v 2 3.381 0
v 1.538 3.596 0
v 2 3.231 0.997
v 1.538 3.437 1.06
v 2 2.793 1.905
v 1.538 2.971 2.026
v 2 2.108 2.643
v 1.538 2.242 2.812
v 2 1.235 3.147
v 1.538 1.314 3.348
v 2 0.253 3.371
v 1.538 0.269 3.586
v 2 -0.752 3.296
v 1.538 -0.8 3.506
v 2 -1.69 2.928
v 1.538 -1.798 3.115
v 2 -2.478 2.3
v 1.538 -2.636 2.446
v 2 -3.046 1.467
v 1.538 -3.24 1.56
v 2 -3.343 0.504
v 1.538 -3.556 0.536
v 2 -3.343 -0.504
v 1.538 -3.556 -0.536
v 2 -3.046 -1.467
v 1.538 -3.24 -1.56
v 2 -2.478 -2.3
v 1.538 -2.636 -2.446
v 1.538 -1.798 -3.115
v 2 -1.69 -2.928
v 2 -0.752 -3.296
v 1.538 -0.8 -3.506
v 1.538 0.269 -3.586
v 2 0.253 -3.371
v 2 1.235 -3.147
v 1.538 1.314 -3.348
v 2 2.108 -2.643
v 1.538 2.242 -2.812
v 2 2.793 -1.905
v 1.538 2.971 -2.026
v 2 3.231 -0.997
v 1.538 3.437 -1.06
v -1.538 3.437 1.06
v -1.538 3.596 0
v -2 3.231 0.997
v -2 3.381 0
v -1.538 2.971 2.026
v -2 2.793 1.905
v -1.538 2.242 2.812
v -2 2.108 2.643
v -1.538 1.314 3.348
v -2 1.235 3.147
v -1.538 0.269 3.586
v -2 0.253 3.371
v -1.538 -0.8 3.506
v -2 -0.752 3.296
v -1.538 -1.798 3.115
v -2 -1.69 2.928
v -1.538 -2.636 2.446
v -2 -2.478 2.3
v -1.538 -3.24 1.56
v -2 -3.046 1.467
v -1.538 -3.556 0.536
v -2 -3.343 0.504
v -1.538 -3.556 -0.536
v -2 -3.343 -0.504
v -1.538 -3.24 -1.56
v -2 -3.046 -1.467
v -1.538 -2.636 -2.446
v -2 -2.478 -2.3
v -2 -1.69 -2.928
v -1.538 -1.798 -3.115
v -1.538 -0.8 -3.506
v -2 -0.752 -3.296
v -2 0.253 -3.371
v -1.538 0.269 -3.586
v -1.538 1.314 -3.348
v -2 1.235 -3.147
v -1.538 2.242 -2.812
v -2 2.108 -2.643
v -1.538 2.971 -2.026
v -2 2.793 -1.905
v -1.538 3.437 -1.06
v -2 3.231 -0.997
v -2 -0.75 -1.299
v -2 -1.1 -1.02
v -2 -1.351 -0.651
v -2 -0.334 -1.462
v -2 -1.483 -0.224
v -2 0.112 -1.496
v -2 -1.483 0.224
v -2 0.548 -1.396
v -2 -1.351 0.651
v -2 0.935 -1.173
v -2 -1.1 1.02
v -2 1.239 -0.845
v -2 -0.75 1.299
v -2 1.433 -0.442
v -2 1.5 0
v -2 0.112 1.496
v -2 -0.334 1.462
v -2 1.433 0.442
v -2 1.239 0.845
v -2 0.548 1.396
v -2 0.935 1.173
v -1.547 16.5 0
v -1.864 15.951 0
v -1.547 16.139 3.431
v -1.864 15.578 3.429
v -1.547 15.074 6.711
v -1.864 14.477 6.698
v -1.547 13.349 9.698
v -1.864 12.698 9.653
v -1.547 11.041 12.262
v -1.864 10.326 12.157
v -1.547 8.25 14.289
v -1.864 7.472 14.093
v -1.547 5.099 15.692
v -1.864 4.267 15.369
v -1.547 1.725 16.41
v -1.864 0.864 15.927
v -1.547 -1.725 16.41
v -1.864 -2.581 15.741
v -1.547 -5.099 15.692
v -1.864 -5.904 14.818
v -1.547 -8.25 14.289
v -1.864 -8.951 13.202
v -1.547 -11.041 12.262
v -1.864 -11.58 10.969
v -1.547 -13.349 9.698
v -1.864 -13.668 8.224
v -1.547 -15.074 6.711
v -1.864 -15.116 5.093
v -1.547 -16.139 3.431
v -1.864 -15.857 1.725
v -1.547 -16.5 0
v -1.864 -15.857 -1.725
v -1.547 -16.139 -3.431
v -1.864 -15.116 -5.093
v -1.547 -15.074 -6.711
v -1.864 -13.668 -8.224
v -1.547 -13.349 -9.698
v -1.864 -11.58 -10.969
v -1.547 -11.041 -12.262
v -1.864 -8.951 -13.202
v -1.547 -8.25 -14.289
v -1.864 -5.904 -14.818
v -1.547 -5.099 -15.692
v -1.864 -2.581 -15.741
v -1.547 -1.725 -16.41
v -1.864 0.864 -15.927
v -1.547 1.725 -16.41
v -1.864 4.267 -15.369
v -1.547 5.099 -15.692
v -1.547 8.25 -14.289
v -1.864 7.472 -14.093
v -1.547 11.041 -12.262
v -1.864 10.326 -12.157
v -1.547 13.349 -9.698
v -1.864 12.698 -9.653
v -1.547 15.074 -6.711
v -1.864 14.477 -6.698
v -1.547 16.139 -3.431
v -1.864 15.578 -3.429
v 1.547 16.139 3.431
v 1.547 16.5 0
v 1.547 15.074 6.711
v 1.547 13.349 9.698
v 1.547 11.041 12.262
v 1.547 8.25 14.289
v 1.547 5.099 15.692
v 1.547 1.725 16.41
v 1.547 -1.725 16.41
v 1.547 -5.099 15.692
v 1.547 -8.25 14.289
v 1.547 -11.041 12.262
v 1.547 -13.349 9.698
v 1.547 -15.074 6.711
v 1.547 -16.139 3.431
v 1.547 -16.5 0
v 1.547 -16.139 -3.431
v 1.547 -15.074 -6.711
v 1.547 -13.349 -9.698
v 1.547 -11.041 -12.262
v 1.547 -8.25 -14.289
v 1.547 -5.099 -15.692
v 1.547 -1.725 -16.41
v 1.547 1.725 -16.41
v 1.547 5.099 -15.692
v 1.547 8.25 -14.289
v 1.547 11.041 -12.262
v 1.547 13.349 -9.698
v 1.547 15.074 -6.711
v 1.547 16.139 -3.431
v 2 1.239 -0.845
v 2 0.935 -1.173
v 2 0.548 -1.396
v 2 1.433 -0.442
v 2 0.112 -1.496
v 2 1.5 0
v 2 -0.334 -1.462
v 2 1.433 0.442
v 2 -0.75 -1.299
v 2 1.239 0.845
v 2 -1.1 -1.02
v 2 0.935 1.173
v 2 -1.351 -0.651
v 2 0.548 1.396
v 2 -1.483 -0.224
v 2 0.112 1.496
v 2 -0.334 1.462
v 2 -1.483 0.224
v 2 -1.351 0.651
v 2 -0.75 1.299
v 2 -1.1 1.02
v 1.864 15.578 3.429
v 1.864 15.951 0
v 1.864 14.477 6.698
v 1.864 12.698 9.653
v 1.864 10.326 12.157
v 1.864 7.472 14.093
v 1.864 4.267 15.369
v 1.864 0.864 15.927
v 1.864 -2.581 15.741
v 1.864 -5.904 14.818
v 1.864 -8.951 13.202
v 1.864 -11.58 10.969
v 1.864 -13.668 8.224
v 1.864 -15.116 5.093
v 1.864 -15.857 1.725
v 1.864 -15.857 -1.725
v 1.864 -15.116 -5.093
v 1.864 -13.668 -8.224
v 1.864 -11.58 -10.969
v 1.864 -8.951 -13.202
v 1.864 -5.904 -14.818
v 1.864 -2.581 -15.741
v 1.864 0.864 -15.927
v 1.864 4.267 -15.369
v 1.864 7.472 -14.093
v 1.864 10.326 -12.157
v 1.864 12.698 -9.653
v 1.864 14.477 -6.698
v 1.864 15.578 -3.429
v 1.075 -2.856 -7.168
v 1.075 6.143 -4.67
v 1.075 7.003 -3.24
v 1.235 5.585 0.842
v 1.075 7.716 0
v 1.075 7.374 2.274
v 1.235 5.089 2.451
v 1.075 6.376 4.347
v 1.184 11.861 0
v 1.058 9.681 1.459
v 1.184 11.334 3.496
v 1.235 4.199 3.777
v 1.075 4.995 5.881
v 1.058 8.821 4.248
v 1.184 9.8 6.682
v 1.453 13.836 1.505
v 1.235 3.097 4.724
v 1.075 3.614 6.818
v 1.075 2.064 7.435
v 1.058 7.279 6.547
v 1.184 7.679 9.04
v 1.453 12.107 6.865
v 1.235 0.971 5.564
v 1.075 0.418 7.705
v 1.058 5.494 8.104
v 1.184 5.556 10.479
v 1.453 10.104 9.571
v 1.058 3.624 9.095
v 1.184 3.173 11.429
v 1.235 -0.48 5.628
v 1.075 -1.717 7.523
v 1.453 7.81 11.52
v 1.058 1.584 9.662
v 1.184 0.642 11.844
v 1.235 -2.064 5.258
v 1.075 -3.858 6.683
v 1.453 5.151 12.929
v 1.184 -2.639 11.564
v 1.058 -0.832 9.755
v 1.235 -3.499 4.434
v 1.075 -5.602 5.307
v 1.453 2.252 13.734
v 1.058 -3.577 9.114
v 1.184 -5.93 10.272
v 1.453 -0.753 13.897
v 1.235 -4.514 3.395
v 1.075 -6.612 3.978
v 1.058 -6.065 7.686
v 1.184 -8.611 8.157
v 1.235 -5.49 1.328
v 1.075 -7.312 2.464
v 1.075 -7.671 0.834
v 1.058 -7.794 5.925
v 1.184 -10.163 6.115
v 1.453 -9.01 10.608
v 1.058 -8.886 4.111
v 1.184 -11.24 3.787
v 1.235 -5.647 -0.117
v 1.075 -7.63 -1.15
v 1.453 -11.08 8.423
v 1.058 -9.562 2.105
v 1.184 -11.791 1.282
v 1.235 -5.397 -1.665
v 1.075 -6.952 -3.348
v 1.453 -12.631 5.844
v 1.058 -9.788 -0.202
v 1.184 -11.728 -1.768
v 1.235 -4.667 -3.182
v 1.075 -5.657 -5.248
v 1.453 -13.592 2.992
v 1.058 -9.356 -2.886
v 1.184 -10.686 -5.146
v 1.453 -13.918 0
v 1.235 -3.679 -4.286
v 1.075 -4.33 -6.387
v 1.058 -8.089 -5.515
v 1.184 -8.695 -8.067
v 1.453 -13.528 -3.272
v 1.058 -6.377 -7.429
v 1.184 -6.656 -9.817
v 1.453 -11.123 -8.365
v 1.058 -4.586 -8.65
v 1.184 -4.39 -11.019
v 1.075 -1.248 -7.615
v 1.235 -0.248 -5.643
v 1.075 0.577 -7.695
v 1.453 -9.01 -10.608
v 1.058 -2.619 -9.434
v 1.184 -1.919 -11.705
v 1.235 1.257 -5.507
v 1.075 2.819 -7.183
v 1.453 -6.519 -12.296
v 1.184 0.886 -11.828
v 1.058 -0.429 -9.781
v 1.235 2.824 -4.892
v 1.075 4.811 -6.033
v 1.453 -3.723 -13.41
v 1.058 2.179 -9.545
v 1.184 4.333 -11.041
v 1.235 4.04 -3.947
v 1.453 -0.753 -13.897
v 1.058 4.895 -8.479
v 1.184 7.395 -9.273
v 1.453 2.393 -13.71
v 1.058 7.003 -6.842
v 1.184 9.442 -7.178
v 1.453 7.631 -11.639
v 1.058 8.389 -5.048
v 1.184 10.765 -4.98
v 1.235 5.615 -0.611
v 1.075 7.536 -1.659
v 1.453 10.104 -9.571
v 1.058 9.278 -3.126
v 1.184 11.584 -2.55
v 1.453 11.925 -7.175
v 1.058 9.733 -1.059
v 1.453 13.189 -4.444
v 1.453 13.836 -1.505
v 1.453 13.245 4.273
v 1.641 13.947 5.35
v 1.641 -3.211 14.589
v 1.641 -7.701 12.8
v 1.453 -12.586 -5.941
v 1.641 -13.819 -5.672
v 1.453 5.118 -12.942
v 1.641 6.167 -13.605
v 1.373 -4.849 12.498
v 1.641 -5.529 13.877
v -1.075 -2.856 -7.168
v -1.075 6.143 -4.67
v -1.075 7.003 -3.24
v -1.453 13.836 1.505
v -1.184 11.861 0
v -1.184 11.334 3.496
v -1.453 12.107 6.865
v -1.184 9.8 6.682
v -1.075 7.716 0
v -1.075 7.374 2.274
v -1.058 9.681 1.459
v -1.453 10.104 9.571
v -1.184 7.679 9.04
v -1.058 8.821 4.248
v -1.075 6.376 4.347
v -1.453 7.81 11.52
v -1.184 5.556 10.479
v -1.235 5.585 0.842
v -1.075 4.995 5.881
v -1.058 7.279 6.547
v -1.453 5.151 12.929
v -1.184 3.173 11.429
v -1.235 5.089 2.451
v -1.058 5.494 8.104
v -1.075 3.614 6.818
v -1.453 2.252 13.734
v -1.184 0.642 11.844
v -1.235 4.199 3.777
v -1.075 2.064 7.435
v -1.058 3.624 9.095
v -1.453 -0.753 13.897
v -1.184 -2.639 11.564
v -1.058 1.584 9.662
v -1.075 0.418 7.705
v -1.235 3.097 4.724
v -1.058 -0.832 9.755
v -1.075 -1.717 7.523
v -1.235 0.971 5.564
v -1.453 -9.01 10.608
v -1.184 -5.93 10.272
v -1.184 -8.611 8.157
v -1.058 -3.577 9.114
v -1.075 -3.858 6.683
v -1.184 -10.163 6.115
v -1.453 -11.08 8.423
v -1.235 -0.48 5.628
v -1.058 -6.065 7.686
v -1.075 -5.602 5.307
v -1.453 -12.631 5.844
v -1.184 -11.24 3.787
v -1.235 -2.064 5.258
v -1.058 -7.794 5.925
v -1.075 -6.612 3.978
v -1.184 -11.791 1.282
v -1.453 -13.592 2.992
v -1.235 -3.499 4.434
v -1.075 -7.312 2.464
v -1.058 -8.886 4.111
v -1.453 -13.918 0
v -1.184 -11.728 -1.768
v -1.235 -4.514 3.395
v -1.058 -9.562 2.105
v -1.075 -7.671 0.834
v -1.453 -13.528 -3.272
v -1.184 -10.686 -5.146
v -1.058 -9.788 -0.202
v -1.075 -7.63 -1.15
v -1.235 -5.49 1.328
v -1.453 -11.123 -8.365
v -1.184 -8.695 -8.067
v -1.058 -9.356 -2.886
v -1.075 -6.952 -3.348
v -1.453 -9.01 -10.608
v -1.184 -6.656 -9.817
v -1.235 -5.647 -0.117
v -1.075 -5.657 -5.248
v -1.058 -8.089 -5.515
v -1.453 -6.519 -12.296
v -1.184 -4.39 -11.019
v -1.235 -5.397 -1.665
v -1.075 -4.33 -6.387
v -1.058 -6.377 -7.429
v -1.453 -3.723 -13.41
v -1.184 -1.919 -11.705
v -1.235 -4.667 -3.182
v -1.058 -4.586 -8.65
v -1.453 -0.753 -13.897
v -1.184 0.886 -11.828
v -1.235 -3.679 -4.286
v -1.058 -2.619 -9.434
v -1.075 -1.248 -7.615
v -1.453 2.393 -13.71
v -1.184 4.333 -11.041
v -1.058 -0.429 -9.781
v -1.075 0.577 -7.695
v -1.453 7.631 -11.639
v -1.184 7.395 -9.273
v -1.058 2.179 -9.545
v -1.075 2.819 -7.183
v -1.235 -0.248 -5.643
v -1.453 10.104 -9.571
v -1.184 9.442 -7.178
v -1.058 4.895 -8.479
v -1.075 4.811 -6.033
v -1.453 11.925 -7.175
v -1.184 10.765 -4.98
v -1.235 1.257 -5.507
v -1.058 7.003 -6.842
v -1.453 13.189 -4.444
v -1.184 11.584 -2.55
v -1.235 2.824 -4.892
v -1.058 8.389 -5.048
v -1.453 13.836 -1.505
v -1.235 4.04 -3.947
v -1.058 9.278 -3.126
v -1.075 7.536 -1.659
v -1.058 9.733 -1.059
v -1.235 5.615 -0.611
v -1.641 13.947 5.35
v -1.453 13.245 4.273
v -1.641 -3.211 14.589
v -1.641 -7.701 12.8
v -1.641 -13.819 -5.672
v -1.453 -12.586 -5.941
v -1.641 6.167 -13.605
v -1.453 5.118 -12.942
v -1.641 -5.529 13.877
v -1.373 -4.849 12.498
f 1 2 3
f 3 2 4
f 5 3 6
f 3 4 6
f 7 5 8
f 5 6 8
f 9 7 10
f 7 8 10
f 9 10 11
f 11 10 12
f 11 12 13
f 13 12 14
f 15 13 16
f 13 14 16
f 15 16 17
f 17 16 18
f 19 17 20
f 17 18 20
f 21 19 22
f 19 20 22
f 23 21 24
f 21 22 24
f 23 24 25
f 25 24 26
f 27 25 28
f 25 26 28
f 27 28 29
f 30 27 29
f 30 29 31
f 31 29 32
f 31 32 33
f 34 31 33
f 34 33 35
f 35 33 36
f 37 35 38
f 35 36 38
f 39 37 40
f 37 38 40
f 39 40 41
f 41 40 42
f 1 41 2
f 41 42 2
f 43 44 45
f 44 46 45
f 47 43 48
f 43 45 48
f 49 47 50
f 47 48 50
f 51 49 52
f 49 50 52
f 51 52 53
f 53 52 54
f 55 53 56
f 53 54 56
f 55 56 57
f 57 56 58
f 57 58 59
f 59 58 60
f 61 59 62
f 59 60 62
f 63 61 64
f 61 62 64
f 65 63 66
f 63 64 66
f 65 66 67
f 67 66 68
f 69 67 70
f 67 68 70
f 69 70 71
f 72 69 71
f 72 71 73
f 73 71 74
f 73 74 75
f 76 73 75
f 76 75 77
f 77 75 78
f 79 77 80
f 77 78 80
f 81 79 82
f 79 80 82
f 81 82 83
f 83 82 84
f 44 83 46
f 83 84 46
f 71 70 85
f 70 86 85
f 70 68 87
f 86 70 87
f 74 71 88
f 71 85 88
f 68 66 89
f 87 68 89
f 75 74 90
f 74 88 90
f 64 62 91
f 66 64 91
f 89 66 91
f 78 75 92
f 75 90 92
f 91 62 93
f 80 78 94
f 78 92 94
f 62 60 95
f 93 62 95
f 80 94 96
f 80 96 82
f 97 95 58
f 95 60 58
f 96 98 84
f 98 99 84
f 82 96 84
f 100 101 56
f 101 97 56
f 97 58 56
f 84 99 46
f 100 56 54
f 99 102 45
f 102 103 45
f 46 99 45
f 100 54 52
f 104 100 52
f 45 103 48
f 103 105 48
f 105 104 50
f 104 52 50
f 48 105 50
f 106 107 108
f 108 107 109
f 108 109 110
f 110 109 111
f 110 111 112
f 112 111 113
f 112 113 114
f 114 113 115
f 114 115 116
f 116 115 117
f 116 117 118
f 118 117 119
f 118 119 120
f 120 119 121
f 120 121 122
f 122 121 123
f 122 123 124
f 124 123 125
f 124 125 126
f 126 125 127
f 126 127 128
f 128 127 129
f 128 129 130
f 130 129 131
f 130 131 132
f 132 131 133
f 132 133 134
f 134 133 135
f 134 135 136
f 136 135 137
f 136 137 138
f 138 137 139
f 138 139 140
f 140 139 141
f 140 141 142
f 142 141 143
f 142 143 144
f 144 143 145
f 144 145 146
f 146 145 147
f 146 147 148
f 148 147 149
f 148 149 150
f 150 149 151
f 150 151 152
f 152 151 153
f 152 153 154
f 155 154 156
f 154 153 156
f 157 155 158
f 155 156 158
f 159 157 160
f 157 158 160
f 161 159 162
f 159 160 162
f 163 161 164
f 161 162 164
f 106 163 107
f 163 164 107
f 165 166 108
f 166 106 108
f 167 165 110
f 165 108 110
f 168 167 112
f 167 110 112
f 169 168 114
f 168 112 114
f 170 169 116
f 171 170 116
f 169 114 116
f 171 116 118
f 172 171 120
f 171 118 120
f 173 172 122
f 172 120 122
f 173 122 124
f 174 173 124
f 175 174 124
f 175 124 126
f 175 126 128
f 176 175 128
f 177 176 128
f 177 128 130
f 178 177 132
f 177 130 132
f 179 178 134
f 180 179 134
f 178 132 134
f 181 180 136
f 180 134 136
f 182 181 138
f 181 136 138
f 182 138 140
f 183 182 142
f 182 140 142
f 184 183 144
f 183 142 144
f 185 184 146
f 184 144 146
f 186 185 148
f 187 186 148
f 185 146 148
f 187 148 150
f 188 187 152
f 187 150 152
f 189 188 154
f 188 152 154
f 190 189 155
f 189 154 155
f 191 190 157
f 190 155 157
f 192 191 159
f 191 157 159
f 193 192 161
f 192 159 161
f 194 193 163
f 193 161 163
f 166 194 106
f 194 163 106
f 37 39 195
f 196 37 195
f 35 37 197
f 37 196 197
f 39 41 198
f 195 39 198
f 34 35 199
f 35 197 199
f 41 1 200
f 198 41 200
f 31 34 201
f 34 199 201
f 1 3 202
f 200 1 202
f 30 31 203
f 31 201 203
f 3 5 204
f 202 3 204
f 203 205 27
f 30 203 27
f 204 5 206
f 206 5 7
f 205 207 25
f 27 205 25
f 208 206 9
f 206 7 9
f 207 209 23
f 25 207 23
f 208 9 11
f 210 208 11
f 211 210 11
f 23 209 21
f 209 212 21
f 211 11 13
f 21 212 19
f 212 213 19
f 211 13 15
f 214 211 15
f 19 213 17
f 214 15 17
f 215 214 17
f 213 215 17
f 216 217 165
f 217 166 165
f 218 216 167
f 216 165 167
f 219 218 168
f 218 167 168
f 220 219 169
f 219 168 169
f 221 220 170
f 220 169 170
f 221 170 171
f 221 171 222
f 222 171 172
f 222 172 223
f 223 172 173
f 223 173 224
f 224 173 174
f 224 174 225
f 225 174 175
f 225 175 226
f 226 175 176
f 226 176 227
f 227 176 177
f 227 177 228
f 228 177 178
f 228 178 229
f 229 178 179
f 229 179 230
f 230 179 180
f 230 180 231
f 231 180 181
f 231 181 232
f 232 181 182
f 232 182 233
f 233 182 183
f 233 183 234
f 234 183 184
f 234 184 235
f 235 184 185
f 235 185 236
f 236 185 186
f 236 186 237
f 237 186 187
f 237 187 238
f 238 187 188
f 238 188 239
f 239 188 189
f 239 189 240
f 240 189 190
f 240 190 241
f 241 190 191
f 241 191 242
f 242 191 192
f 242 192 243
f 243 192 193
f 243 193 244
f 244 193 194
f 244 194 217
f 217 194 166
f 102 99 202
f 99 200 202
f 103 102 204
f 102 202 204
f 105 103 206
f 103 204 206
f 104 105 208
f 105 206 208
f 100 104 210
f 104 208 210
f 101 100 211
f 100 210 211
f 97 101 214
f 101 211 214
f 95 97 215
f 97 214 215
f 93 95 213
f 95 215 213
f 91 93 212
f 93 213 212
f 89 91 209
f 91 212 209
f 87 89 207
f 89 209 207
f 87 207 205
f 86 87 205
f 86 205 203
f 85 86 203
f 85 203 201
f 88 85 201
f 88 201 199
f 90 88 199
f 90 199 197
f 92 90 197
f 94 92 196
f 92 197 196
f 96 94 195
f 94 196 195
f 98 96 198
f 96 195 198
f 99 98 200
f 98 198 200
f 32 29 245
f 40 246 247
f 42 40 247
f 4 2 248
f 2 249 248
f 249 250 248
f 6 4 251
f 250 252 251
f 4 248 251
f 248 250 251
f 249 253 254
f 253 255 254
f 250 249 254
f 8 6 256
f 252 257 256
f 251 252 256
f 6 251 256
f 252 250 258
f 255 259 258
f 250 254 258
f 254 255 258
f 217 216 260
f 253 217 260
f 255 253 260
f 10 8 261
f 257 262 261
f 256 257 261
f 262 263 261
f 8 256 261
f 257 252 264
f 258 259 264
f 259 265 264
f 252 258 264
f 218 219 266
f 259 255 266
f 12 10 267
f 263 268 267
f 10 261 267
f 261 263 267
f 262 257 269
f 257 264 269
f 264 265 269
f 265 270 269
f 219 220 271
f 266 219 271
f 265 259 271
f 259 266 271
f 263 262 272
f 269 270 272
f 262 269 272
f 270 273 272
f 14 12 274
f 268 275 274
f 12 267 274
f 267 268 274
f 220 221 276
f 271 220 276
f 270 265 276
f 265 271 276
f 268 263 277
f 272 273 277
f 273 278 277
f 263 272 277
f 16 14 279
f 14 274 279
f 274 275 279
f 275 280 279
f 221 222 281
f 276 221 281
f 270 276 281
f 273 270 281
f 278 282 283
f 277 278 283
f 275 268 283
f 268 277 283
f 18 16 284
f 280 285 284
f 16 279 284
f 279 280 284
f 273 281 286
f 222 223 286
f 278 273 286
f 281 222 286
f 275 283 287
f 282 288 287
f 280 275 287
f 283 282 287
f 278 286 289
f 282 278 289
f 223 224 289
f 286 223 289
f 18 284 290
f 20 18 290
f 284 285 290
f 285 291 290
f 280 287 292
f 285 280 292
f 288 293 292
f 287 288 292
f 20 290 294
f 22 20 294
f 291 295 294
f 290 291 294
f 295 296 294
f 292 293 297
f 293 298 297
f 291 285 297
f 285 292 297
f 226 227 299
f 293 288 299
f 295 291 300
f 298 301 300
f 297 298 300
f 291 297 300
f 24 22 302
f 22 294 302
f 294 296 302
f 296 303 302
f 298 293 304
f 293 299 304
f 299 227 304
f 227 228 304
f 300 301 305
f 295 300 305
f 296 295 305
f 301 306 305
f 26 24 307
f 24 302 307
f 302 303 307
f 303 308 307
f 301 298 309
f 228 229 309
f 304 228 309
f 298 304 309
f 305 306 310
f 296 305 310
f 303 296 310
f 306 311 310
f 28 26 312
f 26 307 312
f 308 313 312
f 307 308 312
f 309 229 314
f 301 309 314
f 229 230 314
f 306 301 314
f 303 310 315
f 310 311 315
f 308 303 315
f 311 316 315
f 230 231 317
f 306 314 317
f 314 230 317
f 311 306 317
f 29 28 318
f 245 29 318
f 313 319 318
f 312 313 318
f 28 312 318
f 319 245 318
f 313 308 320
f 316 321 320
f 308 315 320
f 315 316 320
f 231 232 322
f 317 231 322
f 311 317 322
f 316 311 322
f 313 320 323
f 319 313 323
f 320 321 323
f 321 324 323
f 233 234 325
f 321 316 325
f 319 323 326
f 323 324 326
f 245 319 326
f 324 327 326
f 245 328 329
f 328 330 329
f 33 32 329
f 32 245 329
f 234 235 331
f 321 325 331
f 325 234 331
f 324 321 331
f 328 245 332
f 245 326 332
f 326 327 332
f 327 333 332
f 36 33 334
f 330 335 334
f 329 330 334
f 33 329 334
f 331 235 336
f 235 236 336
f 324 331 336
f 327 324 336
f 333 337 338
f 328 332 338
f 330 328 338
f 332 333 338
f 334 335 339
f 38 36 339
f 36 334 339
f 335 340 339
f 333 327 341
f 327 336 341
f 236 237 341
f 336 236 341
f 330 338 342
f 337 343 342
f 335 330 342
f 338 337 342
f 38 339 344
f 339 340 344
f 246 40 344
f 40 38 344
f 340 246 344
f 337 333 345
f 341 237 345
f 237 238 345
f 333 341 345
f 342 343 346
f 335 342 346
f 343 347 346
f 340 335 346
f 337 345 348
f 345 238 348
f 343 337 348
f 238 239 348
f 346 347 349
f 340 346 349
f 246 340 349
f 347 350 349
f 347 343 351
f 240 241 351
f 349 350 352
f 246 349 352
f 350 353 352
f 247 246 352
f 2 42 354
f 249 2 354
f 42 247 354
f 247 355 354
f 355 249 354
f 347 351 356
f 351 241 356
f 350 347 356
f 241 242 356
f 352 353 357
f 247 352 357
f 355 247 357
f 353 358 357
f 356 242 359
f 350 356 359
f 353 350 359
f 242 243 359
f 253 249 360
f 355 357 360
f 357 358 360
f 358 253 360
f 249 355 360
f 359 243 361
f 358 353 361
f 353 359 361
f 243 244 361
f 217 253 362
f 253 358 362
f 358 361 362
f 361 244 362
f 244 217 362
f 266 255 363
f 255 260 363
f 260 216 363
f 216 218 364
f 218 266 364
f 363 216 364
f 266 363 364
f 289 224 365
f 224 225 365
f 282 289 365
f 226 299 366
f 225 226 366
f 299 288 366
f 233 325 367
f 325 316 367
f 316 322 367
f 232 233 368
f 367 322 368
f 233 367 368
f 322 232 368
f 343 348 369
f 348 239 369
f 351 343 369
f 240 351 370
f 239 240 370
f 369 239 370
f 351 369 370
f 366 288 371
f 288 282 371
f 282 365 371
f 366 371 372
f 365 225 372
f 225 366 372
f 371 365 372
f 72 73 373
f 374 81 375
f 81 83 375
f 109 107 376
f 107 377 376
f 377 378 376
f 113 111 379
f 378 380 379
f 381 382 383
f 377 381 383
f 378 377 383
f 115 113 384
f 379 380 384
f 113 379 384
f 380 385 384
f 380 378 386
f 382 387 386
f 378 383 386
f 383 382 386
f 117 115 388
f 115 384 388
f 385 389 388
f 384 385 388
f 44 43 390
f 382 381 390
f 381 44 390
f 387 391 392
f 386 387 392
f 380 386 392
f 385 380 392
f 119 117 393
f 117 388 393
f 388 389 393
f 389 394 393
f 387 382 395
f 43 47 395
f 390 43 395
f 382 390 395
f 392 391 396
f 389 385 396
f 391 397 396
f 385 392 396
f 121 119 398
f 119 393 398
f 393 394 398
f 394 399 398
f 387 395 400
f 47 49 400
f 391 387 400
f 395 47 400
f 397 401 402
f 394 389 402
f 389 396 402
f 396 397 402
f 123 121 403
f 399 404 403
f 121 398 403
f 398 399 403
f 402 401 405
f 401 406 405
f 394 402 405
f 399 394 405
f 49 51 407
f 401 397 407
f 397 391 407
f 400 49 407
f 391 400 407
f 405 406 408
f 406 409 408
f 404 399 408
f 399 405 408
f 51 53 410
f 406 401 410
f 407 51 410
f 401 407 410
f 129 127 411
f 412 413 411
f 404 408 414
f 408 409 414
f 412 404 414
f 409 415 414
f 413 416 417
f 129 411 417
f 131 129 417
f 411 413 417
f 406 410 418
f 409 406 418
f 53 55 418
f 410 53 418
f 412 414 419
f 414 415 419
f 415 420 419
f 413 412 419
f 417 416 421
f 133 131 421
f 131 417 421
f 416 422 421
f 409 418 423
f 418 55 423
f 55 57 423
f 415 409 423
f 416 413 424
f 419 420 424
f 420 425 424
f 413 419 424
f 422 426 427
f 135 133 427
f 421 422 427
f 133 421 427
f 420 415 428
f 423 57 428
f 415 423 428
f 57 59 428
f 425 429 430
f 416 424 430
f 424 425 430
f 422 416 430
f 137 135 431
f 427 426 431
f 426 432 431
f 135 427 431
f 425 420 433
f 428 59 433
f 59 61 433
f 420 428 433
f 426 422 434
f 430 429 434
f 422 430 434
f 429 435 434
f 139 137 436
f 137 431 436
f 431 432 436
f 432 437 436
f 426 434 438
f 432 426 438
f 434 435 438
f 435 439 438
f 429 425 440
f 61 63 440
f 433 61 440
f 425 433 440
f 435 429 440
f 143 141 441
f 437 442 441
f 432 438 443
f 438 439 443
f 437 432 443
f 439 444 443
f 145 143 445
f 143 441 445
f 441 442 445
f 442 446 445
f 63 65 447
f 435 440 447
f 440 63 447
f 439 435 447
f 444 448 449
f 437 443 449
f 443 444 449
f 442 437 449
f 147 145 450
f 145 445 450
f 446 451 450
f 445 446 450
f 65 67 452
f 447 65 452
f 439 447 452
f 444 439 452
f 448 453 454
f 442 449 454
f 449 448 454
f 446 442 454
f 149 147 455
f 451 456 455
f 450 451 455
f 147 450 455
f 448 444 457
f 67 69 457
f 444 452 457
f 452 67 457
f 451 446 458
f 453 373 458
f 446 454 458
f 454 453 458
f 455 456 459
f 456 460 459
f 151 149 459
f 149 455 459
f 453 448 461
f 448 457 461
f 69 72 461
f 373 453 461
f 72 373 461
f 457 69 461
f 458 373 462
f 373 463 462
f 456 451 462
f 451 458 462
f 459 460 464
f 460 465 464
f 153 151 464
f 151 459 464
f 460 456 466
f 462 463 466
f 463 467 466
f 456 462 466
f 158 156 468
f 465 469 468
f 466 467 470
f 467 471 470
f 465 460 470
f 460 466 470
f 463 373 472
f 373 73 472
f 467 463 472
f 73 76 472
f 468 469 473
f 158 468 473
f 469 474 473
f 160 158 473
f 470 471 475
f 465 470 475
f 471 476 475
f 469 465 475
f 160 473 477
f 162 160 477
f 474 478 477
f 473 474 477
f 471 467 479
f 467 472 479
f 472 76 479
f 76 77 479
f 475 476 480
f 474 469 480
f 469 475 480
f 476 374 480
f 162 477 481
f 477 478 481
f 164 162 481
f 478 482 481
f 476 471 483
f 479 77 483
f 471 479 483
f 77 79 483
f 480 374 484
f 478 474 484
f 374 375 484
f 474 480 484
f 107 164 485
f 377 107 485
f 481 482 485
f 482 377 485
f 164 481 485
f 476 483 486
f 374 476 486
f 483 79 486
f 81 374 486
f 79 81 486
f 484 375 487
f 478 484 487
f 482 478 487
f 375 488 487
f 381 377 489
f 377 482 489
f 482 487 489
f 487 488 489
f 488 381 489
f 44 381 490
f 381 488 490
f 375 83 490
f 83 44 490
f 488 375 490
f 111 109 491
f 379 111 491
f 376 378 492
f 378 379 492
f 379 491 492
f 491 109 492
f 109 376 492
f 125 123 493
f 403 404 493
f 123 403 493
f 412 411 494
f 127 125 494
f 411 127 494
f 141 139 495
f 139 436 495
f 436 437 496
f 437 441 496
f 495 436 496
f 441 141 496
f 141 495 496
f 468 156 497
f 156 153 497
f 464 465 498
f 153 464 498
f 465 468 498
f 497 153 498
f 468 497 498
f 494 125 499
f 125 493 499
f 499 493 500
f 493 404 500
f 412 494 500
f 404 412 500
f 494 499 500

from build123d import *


with BuildPart() as f1:
    # F0 (on Top) → F1 (revolve)
    with BuildSketch(Plane.XY):
        with BuildLine():
            Line((0, 16.5), (0, 1.5))
            Line((0, 1.5), (2, 1.5))
            Line((2, 1.5), (2, 3.380934))
            Line((2, 3.380934), (1.538045, 3.596347))
            ThreePointArc((1.538045, 3.596347), (1.057793, 9.790565), (1.863727, 15.950878))
            Line((1.863727, 15.950878), (1.546691, 16.5))
            Line((1.546691, 16.5), (0, 16.5))
        make_face()
        with BuildLine():
            Line((-2, 1.5), (0, 1.5))
            Line((0, 1.5), (0, 16.5))
            Line((0, 16.5), (-1.546691, 16.5))
            Line((-1.546691, 16.5), (-1.863727, 15.950878))
            ThreePointArc((-1.863727, 15.950878), (-1.057793, 9.790565), (-1.538045, 3.596347))
            Line((-1.538045, 3.596347), (-2, 3.380934))
            Line((-2, 3.380934), (-2, 1.5))
        make_face()
    revolve(axis=Axis((0.653626, 0, 0), (1, 0, 0)))


solid = f1.part
